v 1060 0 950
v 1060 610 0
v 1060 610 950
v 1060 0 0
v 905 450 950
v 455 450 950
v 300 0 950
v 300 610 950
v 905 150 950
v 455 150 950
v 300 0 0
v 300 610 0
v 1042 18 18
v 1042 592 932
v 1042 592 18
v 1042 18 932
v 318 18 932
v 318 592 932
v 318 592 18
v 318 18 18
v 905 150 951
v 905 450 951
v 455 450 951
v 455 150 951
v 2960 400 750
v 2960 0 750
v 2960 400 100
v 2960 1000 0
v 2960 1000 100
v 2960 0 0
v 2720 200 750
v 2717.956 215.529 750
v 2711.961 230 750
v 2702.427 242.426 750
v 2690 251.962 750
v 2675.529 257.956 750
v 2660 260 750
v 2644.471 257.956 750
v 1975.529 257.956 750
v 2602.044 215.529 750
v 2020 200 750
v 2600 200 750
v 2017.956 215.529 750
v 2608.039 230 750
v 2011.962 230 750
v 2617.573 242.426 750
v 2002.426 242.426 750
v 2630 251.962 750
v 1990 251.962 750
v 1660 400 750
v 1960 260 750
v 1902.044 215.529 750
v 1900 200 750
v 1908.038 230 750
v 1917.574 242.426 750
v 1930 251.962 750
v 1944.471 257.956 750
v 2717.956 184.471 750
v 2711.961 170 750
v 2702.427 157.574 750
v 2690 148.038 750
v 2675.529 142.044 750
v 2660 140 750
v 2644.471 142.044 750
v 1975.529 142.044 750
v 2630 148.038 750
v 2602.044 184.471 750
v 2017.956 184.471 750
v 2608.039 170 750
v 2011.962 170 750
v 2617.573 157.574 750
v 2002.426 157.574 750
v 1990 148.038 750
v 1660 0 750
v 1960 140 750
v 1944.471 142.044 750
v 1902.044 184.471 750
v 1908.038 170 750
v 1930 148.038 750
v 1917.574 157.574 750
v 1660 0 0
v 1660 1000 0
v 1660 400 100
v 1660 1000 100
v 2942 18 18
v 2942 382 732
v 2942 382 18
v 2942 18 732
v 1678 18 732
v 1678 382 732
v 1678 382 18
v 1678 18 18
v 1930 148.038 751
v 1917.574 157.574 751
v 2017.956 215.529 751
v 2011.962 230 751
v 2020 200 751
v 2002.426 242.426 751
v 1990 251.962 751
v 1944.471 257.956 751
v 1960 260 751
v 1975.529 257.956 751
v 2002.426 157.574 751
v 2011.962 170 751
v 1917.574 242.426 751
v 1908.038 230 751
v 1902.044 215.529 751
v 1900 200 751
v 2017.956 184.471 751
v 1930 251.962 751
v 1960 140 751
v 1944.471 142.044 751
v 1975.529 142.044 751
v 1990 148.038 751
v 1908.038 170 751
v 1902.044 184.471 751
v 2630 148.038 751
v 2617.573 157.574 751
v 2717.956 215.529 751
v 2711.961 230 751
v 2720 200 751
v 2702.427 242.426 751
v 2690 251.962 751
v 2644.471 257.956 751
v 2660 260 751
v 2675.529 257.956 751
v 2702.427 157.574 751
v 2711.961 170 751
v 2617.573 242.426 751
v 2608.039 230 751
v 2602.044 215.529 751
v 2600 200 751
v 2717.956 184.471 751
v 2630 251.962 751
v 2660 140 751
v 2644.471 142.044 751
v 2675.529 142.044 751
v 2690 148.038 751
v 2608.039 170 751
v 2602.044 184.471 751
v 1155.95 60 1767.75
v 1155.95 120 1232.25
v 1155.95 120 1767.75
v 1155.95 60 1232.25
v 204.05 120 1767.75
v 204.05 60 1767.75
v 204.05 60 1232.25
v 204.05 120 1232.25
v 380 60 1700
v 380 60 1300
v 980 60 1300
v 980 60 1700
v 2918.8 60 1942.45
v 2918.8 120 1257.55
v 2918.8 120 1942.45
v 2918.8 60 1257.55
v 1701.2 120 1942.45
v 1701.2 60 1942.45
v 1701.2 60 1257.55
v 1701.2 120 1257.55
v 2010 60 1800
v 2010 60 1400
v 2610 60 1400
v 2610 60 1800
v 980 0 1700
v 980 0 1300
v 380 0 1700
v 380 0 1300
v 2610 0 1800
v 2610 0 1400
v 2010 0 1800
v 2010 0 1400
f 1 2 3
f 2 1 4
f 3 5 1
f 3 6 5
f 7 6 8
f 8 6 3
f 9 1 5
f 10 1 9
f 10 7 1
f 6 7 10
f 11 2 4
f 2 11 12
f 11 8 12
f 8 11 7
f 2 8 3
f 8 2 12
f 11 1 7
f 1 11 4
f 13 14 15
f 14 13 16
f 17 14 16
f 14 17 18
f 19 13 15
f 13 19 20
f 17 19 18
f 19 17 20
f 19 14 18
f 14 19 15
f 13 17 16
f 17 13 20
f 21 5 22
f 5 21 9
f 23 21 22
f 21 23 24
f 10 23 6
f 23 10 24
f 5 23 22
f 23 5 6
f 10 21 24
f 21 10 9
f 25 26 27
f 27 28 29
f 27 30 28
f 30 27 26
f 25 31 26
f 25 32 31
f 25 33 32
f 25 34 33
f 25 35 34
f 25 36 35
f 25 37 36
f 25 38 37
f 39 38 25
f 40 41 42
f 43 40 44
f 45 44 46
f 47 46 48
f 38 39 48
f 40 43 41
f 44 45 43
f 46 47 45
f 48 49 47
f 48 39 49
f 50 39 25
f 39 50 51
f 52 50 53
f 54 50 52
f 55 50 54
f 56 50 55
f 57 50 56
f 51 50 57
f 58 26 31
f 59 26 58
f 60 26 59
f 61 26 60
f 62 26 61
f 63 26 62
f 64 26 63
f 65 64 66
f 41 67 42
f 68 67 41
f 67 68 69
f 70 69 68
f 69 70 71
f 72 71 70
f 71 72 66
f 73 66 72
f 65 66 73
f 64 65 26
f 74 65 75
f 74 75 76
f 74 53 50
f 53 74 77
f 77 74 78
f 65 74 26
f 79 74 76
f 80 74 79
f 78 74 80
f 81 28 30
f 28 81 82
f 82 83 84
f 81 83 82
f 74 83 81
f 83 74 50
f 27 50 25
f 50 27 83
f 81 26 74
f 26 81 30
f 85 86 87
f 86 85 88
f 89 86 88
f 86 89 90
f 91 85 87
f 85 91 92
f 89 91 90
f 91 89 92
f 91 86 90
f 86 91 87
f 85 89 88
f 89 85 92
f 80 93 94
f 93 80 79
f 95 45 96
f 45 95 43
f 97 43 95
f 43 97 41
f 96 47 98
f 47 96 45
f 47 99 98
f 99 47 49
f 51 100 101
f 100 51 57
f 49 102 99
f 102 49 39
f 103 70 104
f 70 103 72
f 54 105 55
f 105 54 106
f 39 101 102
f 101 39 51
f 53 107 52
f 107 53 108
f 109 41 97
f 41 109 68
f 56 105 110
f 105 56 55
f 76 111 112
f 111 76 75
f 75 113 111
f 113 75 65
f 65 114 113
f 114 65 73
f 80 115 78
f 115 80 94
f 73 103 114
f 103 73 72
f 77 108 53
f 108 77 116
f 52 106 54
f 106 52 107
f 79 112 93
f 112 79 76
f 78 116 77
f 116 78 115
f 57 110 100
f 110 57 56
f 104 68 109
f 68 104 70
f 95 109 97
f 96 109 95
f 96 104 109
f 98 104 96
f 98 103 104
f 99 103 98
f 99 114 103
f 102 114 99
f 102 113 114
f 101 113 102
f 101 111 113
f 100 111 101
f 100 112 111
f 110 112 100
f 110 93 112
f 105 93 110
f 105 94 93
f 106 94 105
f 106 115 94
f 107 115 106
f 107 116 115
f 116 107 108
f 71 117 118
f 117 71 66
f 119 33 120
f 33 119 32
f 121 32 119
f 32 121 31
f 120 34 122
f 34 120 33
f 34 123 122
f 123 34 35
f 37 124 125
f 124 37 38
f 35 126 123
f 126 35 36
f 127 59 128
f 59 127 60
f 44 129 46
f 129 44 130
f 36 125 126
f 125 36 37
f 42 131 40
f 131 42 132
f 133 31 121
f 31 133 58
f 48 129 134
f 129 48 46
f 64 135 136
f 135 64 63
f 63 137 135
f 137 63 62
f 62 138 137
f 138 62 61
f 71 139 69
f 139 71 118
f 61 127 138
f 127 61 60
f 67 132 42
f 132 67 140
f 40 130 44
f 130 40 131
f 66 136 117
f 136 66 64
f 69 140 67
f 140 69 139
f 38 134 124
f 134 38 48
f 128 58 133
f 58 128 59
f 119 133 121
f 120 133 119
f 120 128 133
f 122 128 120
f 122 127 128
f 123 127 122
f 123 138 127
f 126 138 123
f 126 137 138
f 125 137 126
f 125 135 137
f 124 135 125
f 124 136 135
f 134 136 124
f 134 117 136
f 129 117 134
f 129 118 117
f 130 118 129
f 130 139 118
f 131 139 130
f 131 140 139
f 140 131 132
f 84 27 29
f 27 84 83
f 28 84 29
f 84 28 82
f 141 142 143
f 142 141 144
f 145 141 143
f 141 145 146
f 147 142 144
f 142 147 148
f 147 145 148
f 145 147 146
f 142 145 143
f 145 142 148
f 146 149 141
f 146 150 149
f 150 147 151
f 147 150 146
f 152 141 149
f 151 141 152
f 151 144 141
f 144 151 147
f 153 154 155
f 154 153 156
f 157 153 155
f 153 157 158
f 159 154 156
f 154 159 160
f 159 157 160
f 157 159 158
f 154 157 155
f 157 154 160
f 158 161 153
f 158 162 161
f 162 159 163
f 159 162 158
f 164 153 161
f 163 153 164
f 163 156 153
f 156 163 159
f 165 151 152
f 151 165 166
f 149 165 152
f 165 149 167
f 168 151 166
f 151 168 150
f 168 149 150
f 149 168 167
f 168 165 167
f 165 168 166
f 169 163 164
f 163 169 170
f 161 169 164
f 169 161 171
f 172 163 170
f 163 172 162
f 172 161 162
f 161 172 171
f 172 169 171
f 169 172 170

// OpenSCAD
// =====================================================================
// Basement arcade — concept assembly (OpenSCAD)
// AUTO-GENERATED from parameters.json by generate.py.
// To change geometry: edit parameters.json, then re-run `python generate.py`.
// This file is also plain hand-editable OpenSCAD if you prefer to fork it.
//
// Units: millimetres. Concept-level CAD — joints, kerf, fasteners, actual
// trackball/gun mounting holes, TV VESA pattern, and wall structural
// anchorage are intentionally NOT modelled. Do not send this to a CNC as-is.
//
// Coordinate system (matches parameters.json coordinate_system):
//   origin  = floor level at the illustrative room's left back-wall corner
//   +X      = right, along the back wall (Station A then Station B)
//   +Y      = out from the back wall, into the room (depth)
//   +Z      = up from the floor
// =====================================================================

panel_t = 18;              // plywood panel thickness assumption (mm)

// ---- Station A: trackball pedestal -----------------------------------
ped_w = 760;
ped_d = 610;
ped_h = 950;
ped_x0 = 300;
trackball_d = 76.2;
trackball_cutout_d = 150;
ctrl_zone_w = 450;
ctrl_zone_d = 300;
ctrl_zone_cx = 380;
ctrl_zone_cy = 300;

// ---- Station B: shooter console ----------------------------------------
con_w = 1300;
con_d = 400;
con_h = 750;
con_x0 = 1660;
holster_spacing = 700;
deck_w = 1300;
deck_d = 600;
deck_h = 100;
deck_y0 = 400;

// ---- Wall TVs (active-area volumes only; schematic, no chassis) --------
tv43_w = 951.9;
tv43_h = 535.5;
tv43_center_z = 1500;
tv55_w = 1217.6;
tv55_h = 684.9;
tv55_center_z = 1600;
tv43_depth = 60;
tv55_depth = 60;

// ---- Wall-mount bracket, schematic only (NOT structural, NOT plywood) --
bracket_w = 600;
bracket_d = 60;
bracket_h = 400;

// =====================================================================
// Modules
// =====================================================================

module pedestal_box() {
    // Six-panel plywood box. Trackball control-zone is drawn as an outline
    // on the top deck ONLY — it is explicitly NOT cut here (no unverified
    // mounting holes in a concept file).
    color("burlywood", 0.9)
    translate([ped_x0, 0, 0])
    difference() {
        cube([ped_w, ped_d, ped_h]);
        // hollow the box to show it's a panel shell, not a solid block
        translate([panel_t, panel_t, panel_t])
            cube([ped_w - 2*panel_t, ped_d - 2*panel_t, ped_h - 2*panel_t]);
    }
    // reserved control-zone outline on the deck top (visual marker only)
    color("red", 0.6)
    translate([ped_x0 + ctrl_zone_cx - ctrl_zone_w/2, ctrl_zone_cy - ctrl_zone_d/2, ped_h])
        cube([ctrl_zone_w, ctrl_zone_d, 1]);
}

module shooter_console_box() {
    color("burlywood", 0.9)
    translate([con_x0, 0, 0])
    difference() {
        cube([con_w, con_d, con_h]);
        translate([panel_t, panel_t, panel_t])
            cube([con_w - 2*panel_t, con_d - 2*panel_t, con_h - 2*panel_t]);
    }
    // two holster reserved zones (outline markers only, not cut)
    color("red", 0.6)
    for (dx = [-holster_spacing/2, holster_spacing/2])
        translate([con_x0 + con_w/2 + dx, con_d/2, con_h])
            cylinder(h=1, d=120, $fn=24);
}

module removable_positional_gun_deck() {
    // Reserved footprint only — demountable, non-structural. Shown as a
    // thin low plinth so it reads clearly as "reserved", not "built".
    color("gray", 0.35)
    translate([con_x0, deck_y0, 0])
        cube([deck_w, deck_d, deck_h]);
}

module wall_tv(w, h, center_z, x0, x1, depth) {
    // Active-display-area volume only; bracket standoff is separate.
    // Actual TV chassis/bezel remain unselected.
    cx = (x0 + x1) / 2;
    color("black", 0.85)
    translate([cx - w/2, bracket_d, center_z - h/2])
        cube([w, depth, h]);
}

module wall_mount_bracket(x0, x1, center_z) {
    // Schematic off-the-shelf wall-mount arm silhouette. NOT plywood, NOT
    // structurally engineered here — anchorage into the real wall is gated.
    cx = (x0 + x1) / 2;
    color("dimgray", 0.6)
    translate([cx - bracket_w/2, 0, center_z - bracket_h/2])
        cube([bracket_w, bracket_d, bracket_h]);
}

module room_shell() {
    // Assumed room envelope — EDIT parameters.json room_assumptions to
    // match the real basement once it is measured. Drawn as wireframe
    // edges only so it never reads as "the real room".
    %cube([4500, 3500, 2300]);
}

// =====================================================================
// Assembly
// =====================================================================

room_shell();
pedestal_box();
shooter_console_box();
removable_positional_gun_deck();
wall_tv(tv43_w, tv43_h, tv43_center_z, ped_x0, ped_x0 + ped_w, tv43_depth);
wall_tv(tv55_w, tv55_h, tv55_center_z, con_x0, con_x0 + con_w, tv55_depth);
wall_mount_bracket(ped_x0, ped_x0 + ped_w, tv43_center_z);
wall_mount_bracket(con_x0, con_x0 + con_w, tv55_center_z);

// Basic parametric sanity (OpenSCAD-side mirror of the Python validator) —
// fails the render loudly if parameters.json produced an impossible layout.
assert(ped_w > 0 && ped_d > 0 && ped_h > 0, "pedestal dimensions must be positive");
assert(con_w > 0 && con_d > 0 && con_h > 0, "console dimensions must be positive");
assert(trackball_cutout_d <= min(ctrl_zone_w, ctrl_zone_d),
       "trackball cutout must fit inside the reserved control zone");
assert((con_x0) >= (ped_x0 + ped_w), "Station B must not overlap Station A");
